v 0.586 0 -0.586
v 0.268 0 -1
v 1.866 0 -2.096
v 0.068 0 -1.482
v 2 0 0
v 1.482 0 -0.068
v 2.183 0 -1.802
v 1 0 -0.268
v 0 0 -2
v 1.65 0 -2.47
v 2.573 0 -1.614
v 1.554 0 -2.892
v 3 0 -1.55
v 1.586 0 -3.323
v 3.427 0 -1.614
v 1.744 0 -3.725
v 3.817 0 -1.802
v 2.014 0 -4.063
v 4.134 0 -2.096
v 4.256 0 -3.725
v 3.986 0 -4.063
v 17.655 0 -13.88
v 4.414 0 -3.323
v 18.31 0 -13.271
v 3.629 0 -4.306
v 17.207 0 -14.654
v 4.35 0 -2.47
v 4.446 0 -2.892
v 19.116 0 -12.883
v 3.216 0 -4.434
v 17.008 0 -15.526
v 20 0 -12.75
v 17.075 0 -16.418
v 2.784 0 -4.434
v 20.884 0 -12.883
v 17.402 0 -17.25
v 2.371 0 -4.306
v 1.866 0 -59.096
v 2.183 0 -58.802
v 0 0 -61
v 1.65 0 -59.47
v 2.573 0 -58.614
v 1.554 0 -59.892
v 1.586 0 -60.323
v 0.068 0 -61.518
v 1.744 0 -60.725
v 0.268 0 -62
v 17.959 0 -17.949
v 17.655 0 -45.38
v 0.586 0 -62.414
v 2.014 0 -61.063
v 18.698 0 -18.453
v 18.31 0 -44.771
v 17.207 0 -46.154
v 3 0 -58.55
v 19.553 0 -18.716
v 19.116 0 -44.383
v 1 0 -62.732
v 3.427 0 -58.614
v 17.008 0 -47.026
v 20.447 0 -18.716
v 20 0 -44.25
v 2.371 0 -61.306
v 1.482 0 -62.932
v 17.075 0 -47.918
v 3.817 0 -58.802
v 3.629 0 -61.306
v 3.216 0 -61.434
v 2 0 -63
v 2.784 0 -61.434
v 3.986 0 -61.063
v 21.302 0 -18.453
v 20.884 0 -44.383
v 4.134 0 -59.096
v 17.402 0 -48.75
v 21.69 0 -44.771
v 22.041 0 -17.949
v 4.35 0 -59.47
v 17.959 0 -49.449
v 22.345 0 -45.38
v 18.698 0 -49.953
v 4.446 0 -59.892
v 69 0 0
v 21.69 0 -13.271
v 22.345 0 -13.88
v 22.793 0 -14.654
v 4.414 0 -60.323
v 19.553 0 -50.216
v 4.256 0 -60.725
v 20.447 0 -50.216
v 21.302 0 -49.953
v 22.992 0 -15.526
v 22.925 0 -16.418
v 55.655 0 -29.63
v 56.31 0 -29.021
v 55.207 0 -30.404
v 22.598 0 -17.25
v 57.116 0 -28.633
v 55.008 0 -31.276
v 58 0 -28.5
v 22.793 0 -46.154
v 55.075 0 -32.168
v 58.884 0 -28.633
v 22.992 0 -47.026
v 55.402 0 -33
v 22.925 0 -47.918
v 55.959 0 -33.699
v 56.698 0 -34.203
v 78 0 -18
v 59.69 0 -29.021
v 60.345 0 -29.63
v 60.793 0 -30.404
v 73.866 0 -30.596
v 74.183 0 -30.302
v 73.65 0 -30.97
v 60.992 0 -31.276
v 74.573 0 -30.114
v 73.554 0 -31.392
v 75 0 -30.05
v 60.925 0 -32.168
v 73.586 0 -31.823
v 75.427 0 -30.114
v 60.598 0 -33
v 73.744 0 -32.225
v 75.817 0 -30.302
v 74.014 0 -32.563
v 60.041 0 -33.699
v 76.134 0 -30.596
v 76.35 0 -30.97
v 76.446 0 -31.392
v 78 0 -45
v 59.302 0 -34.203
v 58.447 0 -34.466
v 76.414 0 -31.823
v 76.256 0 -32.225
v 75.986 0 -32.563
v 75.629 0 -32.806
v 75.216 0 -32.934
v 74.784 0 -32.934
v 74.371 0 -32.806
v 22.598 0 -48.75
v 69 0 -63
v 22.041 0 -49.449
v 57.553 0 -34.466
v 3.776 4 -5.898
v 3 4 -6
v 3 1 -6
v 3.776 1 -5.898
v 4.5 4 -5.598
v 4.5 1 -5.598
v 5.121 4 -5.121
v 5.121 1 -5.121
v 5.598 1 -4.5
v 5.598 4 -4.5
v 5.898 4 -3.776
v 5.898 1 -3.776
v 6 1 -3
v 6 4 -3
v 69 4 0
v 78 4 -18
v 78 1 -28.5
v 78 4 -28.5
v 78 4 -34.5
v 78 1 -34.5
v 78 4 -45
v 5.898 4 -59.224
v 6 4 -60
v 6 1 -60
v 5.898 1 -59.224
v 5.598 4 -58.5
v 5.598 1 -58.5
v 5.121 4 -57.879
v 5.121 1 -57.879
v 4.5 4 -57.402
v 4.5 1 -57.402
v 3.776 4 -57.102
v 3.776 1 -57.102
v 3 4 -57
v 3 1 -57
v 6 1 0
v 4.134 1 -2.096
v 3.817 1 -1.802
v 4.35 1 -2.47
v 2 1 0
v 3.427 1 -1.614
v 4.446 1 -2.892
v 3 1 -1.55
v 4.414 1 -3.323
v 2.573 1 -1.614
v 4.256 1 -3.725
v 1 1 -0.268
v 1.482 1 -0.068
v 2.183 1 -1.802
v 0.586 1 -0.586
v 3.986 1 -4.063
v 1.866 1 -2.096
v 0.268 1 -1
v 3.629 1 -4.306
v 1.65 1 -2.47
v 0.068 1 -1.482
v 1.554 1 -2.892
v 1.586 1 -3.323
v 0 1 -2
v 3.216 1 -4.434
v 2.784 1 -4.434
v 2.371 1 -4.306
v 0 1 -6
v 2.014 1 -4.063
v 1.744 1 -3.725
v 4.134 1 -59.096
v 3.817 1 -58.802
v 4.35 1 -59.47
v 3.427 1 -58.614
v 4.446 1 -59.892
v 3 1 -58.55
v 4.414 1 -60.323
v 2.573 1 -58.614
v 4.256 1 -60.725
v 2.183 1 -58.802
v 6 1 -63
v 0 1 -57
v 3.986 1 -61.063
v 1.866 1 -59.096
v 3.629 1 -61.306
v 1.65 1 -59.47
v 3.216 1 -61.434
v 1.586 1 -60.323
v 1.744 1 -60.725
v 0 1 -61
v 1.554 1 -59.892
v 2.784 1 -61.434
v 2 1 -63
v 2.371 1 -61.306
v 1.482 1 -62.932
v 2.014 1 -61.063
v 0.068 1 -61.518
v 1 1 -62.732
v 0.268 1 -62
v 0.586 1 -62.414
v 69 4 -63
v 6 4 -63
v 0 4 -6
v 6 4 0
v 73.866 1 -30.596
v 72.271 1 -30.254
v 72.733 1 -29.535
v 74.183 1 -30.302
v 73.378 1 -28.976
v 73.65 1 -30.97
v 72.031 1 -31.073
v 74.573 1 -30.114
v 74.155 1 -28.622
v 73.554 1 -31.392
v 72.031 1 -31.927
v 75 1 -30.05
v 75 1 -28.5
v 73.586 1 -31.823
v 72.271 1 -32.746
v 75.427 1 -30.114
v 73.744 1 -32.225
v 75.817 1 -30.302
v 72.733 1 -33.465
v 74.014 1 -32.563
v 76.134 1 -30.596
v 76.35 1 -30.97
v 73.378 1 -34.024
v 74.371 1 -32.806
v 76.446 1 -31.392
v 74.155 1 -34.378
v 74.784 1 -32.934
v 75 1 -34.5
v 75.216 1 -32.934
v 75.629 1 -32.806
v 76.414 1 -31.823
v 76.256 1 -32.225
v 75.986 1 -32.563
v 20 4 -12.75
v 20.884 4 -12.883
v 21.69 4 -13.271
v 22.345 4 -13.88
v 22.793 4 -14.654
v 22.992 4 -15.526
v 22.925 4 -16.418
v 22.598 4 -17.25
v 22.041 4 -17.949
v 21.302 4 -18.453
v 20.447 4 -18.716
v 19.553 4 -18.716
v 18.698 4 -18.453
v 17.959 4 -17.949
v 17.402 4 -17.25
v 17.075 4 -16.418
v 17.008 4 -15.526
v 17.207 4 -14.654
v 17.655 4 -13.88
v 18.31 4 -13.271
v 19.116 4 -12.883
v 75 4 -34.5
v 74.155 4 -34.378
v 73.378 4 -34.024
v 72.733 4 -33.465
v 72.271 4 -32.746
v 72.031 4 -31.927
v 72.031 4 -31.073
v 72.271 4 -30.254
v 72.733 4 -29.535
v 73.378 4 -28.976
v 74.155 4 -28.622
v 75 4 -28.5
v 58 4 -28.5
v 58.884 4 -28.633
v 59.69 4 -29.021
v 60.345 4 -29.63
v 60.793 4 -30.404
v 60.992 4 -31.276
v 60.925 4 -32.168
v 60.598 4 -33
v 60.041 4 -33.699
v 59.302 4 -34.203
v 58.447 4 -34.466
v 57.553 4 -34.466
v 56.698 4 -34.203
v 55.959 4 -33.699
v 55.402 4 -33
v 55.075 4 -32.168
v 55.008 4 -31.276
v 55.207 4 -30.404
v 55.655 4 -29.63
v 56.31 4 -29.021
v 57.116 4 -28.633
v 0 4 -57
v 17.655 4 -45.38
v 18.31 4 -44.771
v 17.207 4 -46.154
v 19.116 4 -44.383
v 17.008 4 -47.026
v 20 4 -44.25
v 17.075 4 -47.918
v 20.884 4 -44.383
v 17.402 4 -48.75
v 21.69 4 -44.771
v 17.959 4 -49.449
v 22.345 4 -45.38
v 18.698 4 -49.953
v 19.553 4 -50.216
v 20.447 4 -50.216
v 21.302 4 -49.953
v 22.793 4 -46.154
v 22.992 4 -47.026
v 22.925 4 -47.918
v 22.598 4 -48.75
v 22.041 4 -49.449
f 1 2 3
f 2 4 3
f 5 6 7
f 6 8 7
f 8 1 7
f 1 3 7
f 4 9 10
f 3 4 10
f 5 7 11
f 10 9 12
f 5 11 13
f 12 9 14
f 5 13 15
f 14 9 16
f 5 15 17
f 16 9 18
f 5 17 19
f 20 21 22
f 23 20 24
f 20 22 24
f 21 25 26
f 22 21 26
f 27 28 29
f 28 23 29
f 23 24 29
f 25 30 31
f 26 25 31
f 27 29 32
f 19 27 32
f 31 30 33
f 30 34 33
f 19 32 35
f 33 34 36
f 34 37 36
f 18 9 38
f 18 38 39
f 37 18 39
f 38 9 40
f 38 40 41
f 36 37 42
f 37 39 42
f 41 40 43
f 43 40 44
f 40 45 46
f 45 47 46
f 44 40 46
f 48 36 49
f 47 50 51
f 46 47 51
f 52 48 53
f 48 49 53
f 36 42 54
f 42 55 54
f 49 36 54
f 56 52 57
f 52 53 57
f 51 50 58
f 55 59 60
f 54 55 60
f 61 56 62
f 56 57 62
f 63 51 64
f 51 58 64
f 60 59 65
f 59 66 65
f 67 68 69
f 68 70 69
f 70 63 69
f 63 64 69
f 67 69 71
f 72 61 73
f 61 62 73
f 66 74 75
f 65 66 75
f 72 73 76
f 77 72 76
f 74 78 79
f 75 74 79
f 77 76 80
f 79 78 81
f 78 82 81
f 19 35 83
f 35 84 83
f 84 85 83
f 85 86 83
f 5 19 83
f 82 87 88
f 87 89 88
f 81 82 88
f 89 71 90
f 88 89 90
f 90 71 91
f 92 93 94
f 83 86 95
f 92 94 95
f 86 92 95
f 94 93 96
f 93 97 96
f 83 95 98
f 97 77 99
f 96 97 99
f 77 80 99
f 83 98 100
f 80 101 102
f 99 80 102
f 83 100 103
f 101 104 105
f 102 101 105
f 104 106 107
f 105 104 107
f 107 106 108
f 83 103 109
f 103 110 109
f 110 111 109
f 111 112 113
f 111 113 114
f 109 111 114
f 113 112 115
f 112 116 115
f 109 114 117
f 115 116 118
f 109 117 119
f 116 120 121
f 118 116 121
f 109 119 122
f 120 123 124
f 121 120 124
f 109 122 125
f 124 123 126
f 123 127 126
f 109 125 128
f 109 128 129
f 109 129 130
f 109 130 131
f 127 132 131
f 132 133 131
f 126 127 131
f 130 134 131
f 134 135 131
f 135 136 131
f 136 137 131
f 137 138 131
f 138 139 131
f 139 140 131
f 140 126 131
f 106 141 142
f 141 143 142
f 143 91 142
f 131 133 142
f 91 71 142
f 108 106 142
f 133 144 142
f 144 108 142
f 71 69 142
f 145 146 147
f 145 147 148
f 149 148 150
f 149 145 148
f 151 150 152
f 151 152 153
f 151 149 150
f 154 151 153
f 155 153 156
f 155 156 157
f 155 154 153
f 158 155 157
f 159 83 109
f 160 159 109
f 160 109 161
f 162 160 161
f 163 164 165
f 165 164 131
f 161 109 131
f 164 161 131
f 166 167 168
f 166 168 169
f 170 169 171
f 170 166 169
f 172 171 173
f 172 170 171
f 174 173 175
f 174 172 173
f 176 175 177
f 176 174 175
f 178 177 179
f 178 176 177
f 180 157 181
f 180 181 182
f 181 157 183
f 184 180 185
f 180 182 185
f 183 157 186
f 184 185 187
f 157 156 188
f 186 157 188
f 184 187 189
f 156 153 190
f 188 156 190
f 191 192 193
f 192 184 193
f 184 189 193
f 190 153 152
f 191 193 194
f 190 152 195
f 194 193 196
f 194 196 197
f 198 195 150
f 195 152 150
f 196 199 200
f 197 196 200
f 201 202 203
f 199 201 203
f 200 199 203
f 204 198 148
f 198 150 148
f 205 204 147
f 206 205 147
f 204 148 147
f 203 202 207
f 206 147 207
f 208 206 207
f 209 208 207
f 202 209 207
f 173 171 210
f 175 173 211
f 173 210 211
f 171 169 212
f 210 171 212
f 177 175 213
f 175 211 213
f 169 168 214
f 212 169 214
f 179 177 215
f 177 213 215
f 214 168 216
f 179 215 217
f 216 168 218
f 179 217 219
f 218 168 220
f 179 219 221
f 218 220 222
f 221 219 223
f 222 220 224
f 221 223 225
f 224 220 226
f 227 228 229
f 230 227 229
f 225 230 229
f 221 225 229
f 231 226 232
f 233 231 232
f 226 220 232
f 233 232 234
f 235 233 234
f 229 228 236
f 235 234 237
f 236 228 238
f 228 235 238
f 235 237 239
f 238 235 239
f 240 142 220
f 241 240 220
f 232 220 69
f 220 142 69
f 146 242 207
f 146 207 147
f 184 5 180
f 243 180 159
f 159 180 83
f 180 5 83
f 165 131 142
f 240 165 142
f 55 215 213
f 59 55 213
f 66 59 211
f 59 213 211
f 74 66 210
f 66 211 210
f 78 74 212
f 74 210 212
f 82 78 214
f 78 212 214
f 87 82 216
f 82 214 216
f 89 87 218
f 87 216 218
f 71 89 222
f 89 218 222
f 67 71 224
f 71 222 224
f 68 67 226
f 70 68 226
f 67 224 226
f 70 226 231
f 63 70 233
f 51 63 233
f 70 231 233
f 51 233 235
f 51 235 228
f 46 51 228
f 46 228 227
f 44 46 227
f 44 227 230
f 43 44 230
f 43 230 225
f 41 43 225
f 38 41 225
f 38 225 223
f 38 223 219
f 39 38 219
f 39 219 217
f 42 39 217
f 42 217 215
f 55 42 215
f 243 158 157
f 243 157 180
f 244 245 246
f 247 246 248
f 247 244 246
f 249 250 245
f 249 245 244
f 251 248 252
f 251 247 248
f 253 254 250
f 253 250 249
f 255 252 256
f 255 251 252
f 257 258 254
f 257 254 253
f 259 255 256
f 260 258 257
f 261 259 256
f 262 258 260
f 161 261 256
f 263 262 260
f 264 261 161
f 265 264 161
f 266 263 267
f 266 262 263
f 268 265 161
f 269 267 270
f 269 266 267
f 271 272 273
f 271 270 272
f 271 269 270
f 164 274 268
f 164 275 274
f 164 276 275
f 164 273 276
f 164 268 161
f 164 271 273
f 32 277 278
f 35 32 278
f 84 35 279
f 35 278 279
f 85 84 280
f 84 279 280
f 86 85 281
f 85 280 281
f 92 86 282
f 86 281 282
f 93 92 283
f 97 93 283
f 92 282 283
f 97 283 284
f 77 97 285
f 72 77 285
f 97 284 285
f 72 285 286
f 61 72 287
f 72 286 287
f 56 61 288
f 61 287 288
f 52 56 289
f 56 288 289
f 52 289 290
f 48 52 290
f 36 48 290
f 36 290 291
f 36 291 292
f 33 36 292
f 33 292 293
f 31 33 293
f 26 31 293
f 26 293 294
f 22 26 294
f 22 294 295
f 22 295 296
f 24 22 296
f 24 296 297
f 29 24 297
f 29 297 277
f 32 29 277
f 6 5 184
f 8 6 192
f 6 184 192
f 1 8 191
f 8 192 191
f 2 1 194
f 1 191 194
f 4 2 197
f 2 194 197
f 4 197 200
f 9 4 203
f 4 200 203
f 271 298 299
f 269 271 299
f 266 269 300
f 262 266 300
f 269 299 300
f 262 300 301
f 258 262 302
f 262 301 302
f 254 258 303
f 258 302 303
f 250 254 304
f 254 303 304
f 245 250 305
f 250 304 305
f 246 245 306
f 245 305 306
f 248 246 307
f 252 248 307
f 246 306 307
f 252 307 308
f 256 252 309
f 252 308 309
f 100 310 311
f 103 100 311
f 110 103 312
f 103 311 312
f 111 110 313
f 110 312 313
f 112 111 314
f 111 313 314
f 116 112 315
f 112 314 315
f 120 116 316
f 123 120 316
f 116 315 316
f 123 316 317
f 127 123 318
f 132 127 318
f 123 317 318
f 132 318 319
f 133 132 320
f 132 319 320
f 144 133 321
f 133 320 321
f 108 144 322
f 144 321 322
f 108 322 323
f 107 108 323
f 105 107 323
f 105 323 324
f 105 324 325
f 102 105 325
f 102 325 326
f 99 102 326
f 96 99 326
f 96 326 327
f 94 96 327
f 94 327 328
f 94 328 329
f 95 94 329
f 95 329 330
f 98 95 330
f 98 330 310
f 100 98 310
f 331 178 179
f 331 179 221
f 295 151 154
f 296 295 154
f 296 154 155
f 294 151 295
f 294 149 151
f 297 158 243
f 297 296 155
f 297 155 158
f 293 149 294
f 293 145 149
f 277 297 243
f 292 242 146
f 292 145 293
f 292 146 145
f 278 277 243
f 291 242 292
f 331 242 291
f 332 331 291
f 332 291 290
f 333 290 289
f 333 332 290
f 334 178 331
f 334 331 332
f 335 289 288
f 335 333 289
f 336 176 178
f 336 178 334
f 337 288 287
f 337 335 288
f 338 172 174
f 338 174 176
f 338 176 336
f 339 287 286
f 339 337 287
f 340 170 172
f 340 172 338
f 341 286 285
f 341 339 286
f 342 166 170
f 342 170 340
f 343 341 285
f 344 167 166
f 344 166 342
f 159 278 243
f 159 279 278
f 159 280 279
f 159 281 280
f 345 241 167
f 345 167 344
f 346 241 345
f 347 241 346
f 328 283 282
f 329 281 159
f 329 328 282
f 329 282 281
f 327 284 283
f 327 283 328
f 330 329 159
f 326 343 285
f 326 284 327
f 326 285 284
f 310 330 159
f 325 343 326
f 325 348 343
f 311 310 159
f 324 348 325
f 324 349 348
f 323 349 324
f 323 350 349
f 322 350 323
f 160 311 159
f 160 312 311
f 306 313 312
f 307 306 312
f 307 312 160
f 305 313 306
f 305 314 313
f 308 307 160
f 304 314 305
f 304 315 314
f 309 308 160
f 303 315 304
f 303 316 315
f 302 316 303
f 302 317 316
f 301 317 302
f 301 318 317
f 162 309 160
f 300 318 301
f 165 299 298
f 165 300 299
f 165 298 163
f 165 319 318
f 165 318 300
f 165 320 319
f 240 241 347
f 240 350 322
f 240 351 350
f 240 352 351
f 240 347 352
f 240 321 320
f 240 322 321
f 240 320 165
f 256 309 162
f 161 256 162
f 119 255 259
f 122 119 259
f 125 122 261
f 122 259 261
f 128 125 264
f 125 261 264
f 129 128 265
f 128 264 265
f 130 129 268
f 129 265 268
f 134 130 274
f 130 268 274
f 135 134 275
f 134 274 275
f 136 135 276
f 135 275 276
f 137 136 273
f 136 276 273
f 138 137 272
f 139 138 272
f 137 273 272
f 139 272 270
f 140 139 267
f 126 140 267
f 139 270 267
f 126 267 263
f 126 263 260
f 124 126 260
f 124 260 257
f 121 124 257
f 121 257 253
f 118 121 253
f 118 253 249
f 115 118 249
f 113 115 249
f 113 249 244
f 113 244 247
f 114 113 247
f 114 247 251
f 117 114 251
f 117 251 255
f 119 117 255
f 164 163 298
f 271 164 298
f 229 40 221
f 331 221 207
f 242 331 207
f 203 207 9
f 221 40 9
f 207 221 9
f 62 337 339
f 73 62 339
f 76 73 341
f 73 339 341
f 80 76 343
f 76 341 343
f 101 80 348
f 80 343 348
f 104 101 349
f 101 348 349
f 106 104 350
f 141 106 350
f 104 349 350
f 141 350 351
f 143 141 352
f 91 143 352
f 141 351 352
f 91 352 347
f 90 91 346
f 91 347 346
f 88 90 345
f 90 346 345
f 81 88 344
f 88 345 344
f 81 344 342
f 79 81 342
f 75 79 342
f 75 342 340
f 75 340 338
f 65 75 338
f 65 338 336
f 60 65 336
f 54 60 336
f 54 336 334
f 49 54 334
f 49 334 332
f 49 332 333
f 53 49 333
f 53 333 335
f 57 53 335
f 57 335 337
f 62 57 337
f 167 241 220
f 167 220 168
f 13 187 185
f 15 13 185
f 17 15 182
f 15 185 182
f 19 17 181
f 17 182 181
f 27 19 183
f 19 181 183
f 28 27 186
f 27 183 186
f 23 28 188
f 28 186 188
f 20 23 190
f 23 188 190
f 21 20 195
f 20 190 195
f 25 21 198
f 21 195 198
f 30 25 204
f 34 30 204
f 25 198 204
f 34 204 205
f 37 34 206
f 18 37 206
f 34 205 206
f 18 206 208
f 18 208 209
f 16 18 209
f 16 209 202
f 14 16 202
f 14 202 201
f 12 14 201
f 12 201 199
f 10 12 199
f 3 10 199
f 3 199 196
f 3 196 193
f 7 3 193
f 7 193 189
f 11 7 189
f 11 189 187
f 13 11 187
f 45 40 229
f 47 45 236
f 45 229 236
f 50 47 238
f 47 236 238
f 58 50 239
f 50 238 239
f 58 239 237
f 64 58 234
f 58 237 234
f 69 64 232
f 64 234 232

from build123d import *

# Parameters (mm, degrees)
SALIENTE_EXTRUIR1_DEPTH = 4
CROQUIS2_R              = 1.45
CORTAR_EXTRUIR1_DEPTH   = 4
REDONDEO1_R             = 2
CORTAR_EXTRUIR2_DEPTH   = 3
CROQUIS4_R              = 3
CORTAR_EXTRUIR3_DEPTH   = 10


with BuildPart() as part:
    # Croquis1 → Saliente-Extruir1 (new body)
    with BuildSketch(Plane(origin=(0, 0, 0), x_dir=(1, 0, 0), z_dir=(0, 1, 0))):
        Polygon((63, 0), (69, 0), (78, 18), (78, 45), (69, 63), (63, 63), (0, 63), (0, 0), align=None)
    extrude(amount=SALIENTE_EXTRUIR1_DEPTH)

    # Croquis2 → Cortar-Extruir1 (cut)
    with BuildSketch(Plane(origin=(0, 4, 0), x_dir=(1, 0, 0), z_dir=(0, 1, 0))):
        with Locations(Location((3, 3, 0), (0, 0, 270))):
            Circle(CROQUIS2_R)
        with Locations(Location((3, 60, 0), (0, 0, 270))):
            Circle(CROQUIS2_R)
        with Locations(Location((75, 31.5, 0), (0, 0, 270))):
            Circle(CROQUIS2_R)
    extrude(amount=-CORTAR_EXTRUIR1_DEPTH, mode=Mode.SUBTRACT)

    # Redondeo1
    redondeo1_edges = [part.edges().sort_by_distance(p)[0] for p in [
        (0, 2, -63),
        (0, 2, 0),
    ]]
    fillet(redondeo1_edges, radius=REDONDEO1_R)

    # Croquis3 → Cortar-Extruir2 (cut)
    with BuildSketch(Plane(origin=(0, 4, 0), x_dir=(1, 0, 0), z_dir=(0, 1, 0))):
        with BuildLine():
            Line((6, 3), (6, 0))
            Line((6, 0), (0, 0))
            Line((0, 0), (0, 3))
            Line((0, 3), (0, 6))
            Line((0, 6), (3, 6))
            ThreePointArc((3, 6), (5.121320344, 5.121320344), (6, 3))
        make_face()
        with BuildLine():
            Line((3, 57), (0, 57))
            Line((0, 57), (0, 63))
            Line((0, 63), (6, 63))
            Line((6, 63), (6, 60))
            ThreePointArc((6, 60), (5.121320344, 57.878679656), (3, 57))
        make_face()
        with BuildLine():
            Line((75, 28.5), (78, 28.5))
            Line((78, 28.5), (78, 34.5))
            Line((78, 34.5), (75, 34.5))
            ThreePointArc((75, 34.5), (72, 31.5), (75, 28.5))
        make_face()
    extrude(amount=-CORTAR_EXTRUIR2_DEPTH, mode=Mode.SUBTRACT)

    # Croquis4 → Cortar-Extruir3 (cut)
    with BuildSketch(Plane(origin=(0, 4, 0), x_dir=(1, 0, 0), z_dir=(0, 1, 0))):
        with Locations(Location((20, 47.25, 0), (0, 0, 270))):
            Circle(CROQUIS4_R)
        with Locations(Location((20, 15.75, 0), (0, 0, 270))):
            Circle(CROQUIS4_R)
        with Locations(Location((58, 31.5, 0), (0, 0, 270))):
            Circle(CROQUIS4_R)
    extrude(amount=-CORTAR_EXTRUIR3_DEPTH, mode=Mode.SUBTRACT)


solid = part.part
